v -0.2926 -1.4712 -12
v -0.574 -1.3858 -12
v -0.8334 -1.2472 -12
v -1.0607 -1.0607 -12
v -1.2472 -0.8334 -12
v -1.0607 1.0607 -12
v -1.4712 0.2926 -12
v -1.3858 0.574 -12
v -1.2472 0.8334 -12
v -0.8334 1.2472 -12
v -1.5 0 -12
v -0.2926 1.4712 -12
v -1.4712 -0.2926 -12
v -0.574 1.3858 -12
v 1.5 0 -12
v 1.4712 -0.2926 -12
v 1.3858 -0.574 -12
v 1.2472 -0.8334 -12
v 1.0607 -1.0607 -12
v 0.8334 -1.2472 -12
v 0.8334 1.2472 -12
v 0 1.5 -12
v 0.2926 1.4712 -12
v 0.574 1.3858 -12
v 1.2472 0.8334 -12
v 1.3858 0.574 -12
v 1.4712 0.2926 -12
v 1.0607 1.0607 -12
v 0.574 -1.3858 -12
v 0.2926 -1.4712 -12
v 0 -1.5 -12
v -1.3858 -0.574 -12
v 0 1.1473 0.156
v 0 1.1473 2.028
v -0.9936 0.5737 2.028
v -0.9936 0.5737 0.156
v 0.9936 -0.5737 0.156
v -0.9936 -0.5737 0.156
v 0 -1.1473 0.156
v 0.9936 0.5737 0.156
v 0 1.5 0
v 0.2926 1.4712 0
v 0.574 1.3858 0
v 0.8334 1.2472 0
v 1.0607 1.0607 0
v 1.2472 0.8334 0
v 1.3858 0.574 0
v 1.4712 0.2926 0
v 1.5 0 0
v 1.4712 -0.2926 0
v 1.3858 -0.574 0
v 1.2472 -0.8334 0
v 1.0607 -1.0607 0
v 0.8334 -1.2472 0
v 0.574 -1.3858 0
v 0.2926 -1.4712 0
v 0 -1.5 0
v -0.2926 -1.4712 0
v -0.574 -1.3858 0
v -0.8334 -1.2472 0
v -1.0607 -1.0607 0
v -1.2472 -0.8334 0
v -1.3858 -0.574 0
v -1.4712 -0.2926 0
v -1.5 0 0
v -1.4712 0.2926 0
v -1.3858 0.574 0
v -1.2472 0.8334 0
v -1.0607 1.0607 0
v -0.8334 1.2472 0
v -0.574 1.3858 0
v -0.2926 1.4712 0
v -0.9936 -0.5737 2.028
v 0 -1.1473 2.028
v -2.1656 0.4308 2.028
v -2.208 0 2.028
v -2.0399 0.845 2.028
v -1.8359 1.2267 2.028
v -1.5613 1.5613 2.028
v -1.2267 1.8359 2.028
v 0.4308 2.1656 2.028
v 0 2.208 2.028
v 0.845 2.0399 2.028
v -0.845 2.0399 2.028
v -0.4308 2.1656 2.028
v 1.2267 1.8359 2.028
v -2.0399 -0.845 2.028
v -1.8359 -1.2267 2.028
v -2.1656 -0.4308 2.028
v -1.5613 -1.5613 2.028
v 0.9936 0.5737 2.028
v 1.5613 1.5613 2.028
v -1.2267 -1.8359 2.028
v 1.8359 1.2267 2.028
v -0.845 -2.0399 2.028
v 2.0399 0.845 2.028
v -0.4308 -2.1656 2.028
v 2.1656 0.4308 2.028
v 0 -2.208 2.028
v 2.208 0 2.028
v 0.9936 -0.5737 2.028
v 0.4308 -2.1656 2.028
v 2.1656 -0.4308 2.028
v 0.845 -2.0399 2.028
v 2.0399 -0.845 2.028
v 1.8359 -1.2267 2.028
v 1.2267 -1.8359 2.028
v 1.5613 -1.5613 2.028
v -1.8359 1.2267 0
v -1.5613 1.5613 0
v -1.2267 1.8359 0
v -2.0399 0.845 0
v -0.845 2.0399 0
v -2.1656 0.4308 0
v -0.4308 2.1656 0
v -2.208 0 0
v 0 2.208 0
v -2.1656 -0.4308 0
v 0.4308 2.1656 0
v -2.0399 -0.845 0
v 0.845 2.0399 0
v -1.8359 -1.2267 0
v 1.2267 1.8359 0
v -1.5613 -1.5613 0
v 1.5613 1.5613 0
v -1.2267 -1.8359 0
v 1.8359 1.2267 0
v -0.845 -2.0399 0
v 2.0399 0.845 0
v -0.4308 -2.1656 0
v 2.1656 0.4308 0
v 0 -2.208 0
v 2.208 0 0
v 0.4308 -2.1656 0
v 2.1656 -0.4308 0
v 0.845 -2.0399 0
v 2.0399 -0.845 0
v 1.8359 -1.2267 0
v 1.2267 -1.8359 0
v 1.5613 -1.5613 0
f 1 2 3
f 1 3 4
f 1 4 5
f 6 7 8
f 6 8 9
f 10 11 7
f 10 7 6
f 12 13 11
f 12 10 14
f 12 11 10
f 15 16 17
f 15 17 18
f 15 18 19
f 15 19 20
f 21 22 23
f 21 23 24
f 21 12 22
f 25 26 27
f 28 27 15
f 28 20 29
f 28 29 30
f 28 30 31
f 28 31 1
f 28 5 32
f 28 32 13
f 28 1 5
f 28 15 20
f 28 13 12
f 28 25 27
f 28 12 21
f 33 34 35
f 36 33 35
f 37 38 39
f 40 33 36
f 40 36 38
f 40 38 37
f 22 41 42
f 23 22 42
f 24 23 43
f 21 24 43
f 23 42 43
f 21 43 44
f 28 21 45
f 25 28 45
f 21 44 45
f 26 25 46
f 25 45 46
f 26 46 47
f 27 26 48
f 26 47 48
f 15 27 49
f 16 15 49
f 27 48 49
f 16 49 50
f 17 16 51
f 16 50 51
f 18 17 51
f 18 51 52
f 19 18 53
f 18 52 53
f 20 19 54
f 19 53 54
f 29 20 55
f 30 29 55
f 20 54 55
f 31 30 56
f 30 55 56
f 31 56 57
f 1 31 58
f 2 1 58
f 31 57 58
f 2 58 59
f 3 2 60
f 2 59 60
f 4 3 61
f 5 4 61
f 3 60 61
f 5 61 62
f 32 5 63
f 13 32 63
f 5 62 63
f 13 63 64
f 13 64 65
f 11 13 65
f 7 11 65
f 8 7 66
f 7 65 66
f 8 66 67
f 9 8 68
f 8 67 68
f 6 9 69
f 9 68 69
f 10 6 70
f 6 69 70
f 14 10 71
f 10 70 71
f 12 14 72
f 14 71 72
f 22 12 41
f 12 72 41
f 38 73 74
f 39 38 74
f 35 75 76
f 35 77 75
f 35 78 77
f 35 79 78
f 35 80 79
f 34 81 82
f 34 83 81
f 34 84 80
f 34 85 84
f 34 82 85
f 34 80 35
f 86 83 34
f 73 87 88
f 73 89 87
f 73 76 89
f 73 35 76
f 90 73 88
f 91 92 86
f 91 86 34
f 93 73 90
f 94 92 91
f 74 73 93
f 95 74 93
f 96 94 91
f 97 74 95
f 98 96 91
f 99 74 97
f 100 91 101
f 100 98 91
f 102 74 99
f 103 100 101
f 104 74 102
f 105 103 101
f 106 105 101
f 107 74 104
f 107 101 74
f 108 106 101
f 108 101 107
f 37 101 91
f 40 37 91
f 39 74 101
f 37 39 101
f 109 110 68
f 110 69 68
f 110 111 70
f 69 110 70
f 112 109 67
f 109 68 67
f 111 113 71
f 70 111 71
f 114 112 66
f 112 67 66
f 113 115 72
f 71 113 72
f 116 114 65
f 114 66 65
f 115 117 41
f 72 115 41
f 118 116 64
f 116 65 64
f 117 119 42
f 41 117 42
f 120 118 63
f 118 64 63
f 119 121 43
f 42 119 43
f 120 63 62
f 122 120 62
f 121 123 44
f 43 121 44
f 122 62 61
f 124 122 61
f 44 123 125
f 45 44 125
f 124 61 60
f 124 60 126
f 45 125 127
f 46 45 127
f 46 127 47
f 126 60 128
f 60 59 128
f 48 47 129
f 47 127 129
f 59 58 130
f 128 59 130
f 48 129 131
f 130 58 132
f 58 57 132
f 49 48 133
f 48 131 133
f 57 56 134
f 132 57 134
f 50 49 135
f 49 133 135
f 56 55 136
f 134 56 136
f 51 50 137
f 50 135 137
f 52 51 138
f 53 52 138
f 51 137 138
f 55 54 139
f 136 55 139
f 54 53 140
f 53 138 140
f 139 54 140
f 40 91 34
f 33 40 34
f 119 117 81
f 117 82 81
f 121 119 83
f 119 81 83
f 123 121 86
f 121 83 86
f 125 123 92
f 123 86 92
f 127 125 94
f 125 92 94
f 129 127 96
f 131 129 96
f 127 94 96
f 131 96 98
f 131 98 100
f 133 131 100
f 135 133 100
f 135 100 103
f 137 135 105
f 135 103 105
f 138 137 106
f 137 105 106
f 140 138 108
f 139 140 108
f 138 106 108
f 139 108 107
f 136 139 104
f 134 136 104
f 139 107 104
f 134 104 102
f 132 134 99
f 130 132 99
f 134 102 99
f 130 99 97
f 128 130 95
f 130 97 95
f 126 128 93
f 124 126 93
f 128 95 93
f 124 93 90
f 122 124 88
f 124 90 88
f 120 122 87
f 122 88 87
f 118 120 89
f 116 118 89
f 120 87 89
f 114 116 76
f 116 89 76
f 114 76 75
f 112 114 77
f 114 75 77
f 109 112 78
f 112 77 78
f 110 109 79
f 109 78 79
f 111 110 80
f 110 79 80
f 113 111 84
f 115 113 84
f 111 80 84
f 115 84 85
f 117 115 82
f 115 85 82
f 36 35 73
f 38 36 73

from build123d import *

# Parameters (mm, degrees)
SKETCH_1_W          = 2.208
SKETCH_1_H          = 2.028
SKETCH_2_R          = 1.5
EXTRUDE_1_DEPTH     = 12
CUT_EXTRUDE_1_DEPTH = 1.872


with BuildPart() as part:
    # 草图1 → 旋转1 (revolve)
    with BuildSketch(Plane.XZ, mode=Mode.PRIVATE) as revolve_1_sk:
        with Locations((1.104, 1.014)):
            Rectangle(SKETCH_1_W, SKETCH_1_H)
    revolve(revolve_1_sk.sketch.rotate(Axis((0, 0, 2.028), (0, 0, -1)), 270), axis=Axis((0, 0, 2.028), (0, 0, -1)))

    # 草图2 → 凸台-拉伸1 (add)
    with BuildSketch(Plane(origin=(0, 0, 0), x_dir=(-1, 0, 0), z_dir=(0, 0, -1))):
        with Locations(Location((0, 0, 0), (0, 0, 90))):
            Circle(SKETCH_2_R)
    extrude(amount=EXTRUDE_1_DEPTH)

    # 草图3 → 切除-拉伸1 (cut)
    with BuildSketch(Plane.XY.offset(2.028)):
        Polygon((0.9936, -0.573655227), (0.9936, 0.573655227), (0, 1.147310455), (-0.9936, 0.573655227), (-0.9936, -0.573655227), (0, -1.147310455), align=None)
    extrude(amount=-CUT_EXTRUDE_1_DEPTH, mode=Mode.SUBTRACT)


solid = part.part
